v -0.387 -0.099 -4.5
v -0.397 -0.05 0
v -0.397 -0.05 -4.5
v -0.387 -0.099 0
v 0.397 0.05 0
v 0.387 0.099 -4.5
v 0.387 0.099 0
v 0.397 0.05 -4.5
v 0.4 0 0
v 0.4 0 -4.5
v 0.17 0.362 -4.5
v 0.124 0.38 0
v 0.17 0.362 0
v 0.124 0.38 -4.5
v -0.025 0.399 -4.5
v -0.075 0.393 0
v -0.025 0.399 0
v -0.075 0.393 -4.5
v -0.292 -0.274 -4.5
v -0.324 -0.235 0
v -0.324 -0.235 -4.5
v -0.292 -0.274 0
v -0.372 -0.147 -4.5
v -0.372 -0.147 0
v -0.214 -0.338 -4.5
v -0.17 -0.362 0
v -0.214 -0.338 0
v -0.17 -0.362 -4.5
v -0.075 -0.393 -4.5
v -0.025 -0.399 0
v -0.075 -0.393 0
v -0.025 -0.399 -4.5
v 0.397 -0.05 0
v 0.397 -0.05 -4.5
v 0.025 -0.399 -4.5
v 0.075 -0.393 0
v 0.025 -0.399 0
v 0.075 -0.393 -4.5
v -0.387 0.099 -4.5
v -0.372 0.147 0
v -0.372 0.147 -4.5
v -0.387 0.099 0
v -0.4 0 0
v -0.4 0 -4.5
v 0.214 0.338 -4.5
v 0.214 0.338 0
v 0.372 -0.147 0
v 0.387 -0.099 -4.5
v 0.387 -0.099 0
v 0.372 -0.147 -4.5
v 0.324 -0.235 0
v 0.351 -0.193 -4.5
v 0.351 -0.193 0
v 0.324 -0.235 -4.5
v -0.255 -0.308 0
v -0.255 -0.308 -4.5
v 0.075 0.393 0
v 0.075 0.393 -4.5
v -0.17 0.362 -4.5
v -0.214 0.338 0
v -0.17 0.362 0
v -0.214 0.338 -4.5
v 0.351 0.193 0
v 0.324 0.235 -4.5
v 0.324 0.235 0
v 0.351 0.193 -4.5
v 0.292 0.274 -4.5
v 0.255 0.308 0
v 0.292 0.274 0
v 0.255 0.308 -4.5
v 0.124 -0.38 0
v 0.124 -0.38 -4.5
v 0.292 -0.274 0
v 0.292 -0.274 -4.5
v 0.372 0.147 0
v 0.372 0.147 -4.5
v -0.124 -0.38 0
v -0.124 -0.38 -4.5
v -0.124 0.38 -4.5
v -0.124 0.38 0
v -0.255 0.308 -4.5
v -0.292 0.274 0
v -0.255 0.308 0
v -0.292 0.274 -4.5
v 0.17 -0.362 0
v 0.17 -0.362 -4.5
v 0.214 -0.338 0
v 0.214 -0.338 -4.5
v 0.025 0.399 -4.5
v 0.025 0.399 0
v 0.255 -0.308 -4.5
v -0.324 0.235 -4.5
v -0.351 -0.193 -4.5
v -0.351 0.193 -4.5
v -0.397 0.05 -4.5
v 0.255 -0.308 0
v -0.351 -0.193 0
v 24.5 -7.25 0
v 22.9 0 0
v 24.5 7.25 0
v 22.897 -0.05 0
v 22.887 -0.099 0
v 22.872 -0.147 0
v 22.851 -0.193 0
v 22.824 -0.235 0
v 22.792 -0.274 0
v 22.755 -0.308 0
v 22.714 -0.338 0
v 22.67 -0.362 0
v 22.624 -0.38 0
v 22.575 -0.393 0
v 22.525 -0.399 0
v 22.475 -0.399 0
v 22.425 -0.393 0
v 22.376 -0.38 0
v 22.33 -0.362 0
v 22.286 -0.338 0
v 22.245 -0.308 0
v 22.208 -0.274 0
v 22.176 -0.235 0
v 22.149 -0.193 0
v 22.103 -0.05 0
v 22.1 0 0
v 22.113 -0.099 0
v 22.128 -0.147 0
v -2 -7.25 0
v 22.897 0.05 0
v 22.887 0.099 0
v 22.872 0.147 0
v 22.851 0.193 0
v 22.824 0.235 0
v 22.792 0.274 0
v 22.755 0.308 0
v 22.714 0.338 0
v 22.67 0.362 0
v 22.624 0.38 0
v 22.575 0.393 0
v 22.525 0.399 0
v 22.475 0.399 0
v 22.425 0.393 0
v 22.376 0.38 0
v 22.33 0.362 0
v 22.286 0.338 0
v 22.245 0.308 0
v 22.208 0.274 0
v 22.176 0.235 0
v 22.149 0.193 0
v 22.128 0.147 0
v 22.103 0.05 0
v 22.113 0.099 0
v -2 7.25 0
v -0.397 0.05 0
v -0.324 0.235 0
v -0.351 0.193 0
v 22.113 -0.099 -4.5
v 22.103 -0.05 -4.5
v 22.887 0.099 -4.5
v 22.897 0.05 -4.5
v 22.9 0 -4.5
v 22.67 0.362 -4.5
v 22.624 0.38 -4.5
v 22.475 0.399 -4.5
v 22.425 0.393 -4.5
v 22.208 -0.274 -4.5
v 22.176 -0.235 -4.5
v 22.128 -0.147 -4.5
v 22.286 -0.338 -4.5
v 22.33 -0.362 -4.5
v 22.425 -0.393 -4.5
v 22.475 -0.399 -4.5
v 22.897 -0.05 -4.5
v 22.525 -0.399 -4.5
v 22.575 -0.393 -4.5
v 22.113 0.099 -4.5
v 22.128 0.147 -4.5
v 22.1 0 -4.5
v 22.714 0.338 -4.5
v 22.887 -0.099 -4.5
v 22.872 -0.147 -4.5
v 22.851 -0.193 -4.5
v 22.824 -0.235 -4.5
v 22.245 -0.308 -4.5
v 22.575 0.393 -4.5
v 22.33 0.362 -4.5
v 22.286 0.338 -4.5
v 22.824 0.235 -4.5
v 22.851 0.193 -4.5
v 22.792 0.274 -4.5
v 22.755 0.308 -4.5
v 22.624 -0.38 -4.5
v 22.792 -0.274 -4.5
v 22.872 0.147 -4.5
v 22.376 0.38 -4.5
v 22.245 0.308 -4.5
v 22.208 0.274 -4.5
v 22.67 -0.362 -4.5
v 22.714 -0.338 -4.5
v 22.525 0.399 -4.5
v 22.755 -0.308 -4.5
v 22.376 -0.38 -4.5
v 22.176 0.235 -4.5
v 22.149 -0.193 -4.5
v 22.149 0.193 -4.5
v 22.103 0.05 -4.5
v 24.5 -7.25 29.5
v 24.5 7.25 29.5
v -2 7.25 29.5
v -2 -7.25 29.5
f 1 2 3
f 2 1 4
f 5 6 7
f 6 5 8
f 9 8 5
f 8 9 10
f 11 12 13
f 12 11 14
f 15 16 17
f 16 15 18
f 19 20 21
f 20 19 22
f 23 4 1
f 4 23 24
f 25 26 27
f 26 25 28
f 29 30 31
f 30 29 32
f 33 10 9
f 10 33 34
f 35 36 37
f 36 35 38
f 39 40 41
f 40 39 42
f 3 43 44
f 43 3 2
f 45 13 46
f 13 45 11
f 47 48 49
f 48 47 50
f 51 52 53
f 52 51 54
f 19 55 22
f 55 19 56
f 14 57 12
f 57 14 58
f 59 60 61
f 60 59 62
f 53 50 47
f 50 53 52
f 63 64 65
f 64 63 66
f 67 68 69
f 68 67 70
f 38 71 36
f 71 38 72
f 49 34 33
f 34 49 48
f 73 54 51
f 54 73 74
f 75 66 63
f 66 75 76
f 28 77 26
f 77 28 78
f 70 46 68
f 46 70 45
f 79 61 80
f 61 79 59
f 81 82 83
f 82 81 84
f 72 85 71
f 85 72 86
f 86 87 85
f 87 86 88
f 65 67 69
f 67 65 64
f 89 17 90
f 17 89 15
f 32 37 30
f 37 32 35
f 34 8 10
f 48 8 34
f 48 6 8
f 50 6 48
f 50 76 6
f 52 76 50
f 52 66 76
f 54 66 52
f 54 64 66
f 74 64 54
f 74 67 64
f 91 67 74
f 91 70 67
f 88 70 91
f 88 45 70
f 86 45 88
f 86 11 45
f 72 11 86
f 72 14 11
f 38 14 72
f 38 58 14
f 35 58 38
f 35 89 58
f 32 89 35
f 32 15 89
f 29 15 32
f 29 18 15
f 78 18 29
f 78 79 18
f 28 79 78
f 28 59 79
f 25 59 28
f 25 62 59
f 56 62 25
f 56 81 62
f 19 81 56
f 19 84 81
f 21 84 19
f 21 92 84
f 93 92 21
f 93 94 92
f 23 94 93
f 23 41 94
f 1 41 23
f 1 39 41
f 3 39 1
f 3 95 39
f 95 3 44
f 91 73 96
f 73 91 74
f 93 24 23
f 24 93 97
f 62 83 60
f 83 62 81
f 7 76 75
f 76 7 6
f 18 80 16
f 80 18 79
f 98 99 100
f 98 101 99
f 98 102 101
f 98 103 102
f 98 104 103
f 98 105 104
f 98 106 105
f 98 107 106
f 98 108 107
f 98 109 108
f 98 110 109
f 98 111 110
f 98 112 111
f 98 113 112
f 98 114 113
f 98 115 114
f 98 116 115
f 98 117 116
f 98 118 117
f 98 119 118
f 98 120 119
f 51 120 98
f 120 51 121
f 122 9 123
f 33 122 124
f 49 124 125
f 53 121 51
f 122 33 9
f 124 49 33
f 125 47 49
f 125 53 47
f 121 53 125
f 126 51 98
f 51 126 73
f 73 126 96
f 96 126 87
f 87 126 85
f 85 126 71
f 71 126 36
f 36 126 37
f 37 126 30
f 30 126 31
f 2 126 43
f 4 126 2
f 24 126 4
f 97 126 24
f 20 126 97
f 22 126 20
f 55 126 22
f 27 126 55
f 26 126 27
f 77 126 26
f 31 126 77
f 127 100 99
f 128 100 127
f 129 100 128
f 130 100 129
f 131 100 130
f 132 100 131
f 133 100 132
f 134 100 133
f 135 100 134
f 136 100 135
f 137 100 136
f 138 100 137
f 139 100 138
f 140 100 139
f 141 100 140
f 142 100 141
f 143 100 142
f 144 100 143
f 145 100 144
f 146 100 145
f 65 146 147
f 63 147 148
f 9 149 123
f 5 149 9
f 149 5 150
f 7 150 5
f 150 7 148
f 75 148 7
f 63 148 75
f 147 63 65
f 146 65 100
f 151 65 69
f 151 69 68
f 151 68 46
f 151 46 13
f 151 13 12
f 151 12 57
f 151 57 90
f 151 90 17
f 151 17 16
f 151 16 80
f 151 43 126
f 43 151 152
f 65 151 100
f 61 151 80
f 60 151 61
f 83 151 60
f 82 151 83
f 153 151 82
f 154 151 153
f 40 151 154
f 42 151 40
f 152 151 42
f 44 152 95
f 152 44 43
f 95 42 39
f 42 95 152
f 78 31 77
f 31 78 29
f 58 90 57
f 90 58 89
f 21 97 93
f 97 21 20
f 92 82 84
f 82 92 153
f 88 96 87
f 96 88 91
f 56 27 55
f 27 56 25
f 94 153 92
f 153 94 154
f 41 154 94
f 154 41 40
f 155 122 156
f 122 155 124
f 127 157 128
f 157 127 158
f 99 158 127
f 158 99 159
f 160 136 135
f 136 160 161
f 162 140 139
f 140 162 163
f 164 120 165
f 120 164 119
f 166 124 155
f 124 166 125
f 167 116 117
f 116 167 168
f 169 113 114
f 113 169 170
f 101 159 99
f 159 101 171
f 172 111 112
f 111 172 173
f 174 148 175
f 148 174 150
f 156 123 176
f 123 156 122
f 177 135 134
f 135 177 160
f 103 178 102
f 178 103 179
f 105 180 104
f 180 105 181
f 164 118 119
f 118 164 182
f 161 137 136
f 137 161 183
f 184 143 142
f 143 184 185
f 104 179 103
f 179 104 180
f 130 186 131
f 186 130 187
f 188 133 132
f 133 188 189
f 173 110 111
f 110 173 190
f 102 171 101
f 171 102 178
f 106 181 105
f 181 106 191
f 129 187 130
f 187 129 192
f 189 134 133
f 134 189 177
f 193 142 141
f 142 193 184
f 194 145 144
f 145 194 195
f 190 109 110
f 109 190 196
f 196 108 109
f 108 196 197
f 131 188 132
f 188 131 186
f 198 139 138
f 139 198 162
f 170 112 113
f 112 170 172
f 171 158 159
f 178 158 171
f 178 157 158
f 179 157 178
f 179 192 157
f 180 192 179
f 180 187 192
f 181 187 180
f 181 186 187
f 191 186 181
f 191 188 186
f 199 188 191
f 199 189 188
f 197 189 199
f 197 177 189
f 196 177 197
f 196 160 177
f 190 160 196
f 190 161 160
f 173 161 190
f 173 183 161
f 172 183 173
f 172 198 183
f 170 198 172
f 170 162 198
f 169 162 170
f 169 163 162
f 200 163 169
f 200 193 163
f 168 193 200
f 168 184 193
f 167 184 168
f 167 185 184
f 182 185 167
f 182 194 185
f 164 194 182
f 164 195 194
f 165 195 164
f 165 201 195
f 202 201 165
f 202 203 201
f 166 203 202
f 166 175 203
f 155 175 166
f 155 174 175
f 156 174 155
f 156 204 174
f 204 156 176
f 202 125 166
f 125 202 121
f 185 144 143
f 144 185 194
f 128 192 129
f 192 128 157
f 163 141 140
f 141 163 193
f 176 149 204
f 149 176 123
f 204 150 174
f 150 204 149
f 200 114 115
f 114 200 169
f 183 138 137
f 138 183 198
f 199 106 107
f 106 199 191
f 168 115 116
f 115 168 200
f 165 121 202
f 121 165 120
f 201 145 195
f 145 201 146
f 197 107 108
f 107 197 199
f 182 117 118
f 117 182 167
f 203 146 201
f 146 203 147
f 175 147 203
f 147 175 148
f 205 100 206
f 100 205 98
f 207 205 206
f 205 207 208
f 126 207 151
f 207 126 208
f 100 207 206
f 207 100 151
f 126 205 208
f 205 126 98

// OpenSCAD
/*
*   3dModel creation scripts for KiCAD by Knochi
*   export as .csg, import in freecad and proceed with KiCadStepUp
*/


$fn=50;

/* [Select] */
export= "C32"; //["PDUUAT16","ACT1210","SumidaCR43","TY6028","C32","none"]

/* [Variants] */
capSize=[26.5,14.5,29.5];
capPitch=[22.5,0];
capLeadDia=0.8;
capLeadLngth=4.5;

/* [Hidden] */
fudge=0.1;
// -- Kicad diffuse colors --
ledAlpha=0.1;
glassAlpha=0.39;
metalGreyPinCol=    [0.824, 0.820,  0.781];
metalGreyCol=       [0.298, 0.298,  0.298]; //metal Grey
metalCopperCol=     [0.7038,0.27048,0.0828]; //metal Copper
metalAluminiumCol=  [0.372322, 0.371574, 0.373173];
metalBronzeCol=     [0.714, 0.4284, 0.18144];
metalSilverCol=     [0.50754, 0.50754, 0.50754];
resblackBodyCol=    [0.082, 0.086,  0.094]; //resistor black body
darkGreyBodyCol=    [0.273, 0.273,  0.273]; //dark grey body
brownBodyCol=       [0.379, 0.270,  0.215]; //brown Body
lightBrownBodyCol=  [0.883, 0.711,  0.492]; //light brown body
pinkBodyCol=        [0.578, 0.336,  0.352]; //pink body
blueBodyCol=        [0.137, 0.402,  0.727]; //blue body
greenBodyCol=       [0.340, 0.680,  0.445]; //green body
orangeBodyCol=      [0.809, 0.426,  0.148]; //orange body
redBodyCol=         [0.700, 0.100,  0.050]; 
yellowBodyCol=      [0.832, 0.680,  0.066];
whiteBodyCol=       [0.895, 0.891,  0.813];
metalGoldPinCol=    [0.859, 0.738,  0.496];
blackBodyCol=       [0.148, 0.145,  0.145];
greyBodyCol=        [0.250, 0.262,  0.281];
lightBrownLabelCol= [0.691, 0.664,  0.598];
ledBlueCol=         [0.700, 0.100,  0.050, ledAlpha];
ledYellowCol=       [0.100, 0.250,  0.700, ledAlpha];
ledGreyCol=         [0.98,  0.840,  0.066, ledAlpha];
ledWhiteCol=        [0.895, 0.891, 0.813, ledAlpha];
ledgreyCol=         [0.27, 0.25, 0.27, ledAlpha];
ledBlackCol=        [0.1, 0.05, 0.1];
ledGreenCol=        [0.400, 0.700,  0.150, ledAlpha];
glassGreyCol=       [0.400769, 0.441922, 0.459091, glassAlpha];
glassGoldCol=       [0.566681, 0.580872, 0.580874, glassAlpha];
glassBlueCol=       [0.000000, 0.631244, 0.748016, glassAlpha];
glassGreenCol=      [0.000000, 0.75, 0.44, glassAlpha];
glassOrangeCol=     [0.75, 0.44, 0.000000, glassAlpha];
pcbGreenCol=        [0.07,  0.3,    0.12]; //pcb green
pcbBlackCol=        [0.16,  0.16,   0.16]; //pcb black
pcbBlue=            [0.07,  0.12,   0.3];
FR4darkCol=         [0.2,   0.17,   0.087]; //?
FR4Col=             [0.43,  0.46,   0.295]; //?

if (export == "PDUUAT16")
  !PDUU(false);
else if (export == "ACT1210")
  !ACT1210();
else if (export == "SumidaCR43")
  !sumidaCR43();
else if (export == "TY6028")
  !TY_6028();
else if (export == "C32")
  !boxCapacitor(size=capSize, leads=[capLeadDia,capLeadLngth], pitch=capPitch);
else
  echo("Nothing to render!")

*boxCapacitor();
module boxCapacitor(size=[57,35,50], leads=[1.2,5.5], pitch=[52.5,20.3], center=false){
  //e.g. https://www.alfatec.de/fileadmin/Webdata/Datenblaetter/Faratronic/C3D_Specification_alfatec.pdf
  // C3D3A406KM0AC00, 4 pin DC, lead length 5.5mm, 
  // size=[W,T,H], leads=[d,C], pitch=[P,b] (set b to zero for 2pin)

  //pitch=52.5;
  rad=1;
  cntrOffset = (center) ? [0,0,0] : [pitch.x/2,-pitch.y/2,0];
  iyPins= pitch[1] ? [-1,1] : [0]; //if pitch[1] not zero --> four pin
  translate(cntrOffset){
    /* rounded corners, problems with import into freecad
    color(greyBodyCol) linear_extrude(size.z-rad) hull()
      for (ix=[-1,1],iy=[-1,1]) translate([ix*(size.x/2-rad),iy*(size.y/2-rad),0]) circle(rad); 
    color(greyBodyCol) for (ix=[-1,1],iy=[-1,1]){
      translate([ix*(size.x/2-rad),iy*(size.y/2-rad),size.z-rad]) sphere(rad);
      if (iy==1) translate([ix*(size.x/2-rad),0,size.z-rad]) rotate([90,0,0]) cylinder(r=rad,h=size.y-rad*2,center=true);
      if (ix==1) translate([0,iy*(size.y/2-rad),size.z-rad]) rotate([0,90,0]) cylinder(r=rad,h=size.x-rad*2,center=true);
    }
    color(greyBodyCol) translate([0,0,size.z-rad]) cube([size.x-rad*2,size.y-rad*2,rad*2],true);
    */
    color(greyBodyCol) translate([0,0,size.z/2]) cube(size,true);
    for (ix=[-1,1],iy=iyPins)
      color(metalGreyPinCol) translate([ix*pitch.x/2,iy*pitch.y/2,-leads[1]]) 
        cylinder(d=leads[0],h=leads[1]);
  }

}

module SMDpassive(size="0805", thick=0, label=""){
  // SMD chip resistors, capacitors and other passives by EIA standard
  // e.g. 0805 means 0.08" by 0.05"
  // Dimensions (height, metallization) from Vishay CHP resistors
  // [size,body,capsWdth]
  dimsLUT=[
       ["0201",[0.6,0.3,0.25],0.1],
       ["0402",[1.02,0.5,0.38],0.25],
       ["0603",[1.6,0.8,0.45],0.3],
       ["0805",[2,1.25,0.55],0.4],
       ["1206",[3.2,1.6,0.55],0.45],
       ["1210",[3.2,2.6,0.55],0.5],
       ["1812",[4.6,3.2,0.55],0.5],
       ["2010",[5.0,2.5,0.55],0.6],
       ["2512",[6.35,3.2,0.55],0.6]
       ];
  
  testLUT=[ ["abc",3],["def",5],["gh",6] ];
  
  mtlLngth=dimsLUT[search([size],dimsLUT)[0]][2];//length of metallization
  bdDims=dimsLUT[search([size],dimsLUT)[0]][1]-[mtlLngth,0,0];
  ovThick= thick ? thick : bdDims.z;
  
  txtSize=bdDims.x/(0.8*len(label));
  if (label)
    color("white") translate([0,0,ovThick]) linear_extrude(0.1) 
      text(text=label,size=txtSize,halign="center",valign="center", font="consolas");
  
  
  //body
  color("darkSlateGrey") translate([0,0,ovThick/2]) cube([bdDims.x,bdDims.y,ovThick],true);
  //caps
  for (i=[-1,1]) color("silver")
    translate([i*(bdDims.x+mtlLngth)/2,0,ovThick/2]) cube([mtlLngth,bdDims.y,ovThick],true);
}


// -- helper modules --

module rndRectInt(size=[5,5,2],rad=1,center=false, method=""){
  
  cntrOffset= (center) ? [0,0,0] : [size.x/2,size.y/2,size.z/2];

  if (method=="offset") //doesn't work with freecad
    translate(cntrOffset+[0,0,-size.z/2]) linear_extrude(size.z) offset(rad) square([size.x-rad*2,size.y-rad*2],true);
  else
    translate(cntrOffset) hull() for (ix=[-1,1],iy=[-1,1])
      translate([ix*(size.x/2-rad),iy*(size.y/2-rad),0]) cylinder(r=rad,h=size.z,center=true);
}
